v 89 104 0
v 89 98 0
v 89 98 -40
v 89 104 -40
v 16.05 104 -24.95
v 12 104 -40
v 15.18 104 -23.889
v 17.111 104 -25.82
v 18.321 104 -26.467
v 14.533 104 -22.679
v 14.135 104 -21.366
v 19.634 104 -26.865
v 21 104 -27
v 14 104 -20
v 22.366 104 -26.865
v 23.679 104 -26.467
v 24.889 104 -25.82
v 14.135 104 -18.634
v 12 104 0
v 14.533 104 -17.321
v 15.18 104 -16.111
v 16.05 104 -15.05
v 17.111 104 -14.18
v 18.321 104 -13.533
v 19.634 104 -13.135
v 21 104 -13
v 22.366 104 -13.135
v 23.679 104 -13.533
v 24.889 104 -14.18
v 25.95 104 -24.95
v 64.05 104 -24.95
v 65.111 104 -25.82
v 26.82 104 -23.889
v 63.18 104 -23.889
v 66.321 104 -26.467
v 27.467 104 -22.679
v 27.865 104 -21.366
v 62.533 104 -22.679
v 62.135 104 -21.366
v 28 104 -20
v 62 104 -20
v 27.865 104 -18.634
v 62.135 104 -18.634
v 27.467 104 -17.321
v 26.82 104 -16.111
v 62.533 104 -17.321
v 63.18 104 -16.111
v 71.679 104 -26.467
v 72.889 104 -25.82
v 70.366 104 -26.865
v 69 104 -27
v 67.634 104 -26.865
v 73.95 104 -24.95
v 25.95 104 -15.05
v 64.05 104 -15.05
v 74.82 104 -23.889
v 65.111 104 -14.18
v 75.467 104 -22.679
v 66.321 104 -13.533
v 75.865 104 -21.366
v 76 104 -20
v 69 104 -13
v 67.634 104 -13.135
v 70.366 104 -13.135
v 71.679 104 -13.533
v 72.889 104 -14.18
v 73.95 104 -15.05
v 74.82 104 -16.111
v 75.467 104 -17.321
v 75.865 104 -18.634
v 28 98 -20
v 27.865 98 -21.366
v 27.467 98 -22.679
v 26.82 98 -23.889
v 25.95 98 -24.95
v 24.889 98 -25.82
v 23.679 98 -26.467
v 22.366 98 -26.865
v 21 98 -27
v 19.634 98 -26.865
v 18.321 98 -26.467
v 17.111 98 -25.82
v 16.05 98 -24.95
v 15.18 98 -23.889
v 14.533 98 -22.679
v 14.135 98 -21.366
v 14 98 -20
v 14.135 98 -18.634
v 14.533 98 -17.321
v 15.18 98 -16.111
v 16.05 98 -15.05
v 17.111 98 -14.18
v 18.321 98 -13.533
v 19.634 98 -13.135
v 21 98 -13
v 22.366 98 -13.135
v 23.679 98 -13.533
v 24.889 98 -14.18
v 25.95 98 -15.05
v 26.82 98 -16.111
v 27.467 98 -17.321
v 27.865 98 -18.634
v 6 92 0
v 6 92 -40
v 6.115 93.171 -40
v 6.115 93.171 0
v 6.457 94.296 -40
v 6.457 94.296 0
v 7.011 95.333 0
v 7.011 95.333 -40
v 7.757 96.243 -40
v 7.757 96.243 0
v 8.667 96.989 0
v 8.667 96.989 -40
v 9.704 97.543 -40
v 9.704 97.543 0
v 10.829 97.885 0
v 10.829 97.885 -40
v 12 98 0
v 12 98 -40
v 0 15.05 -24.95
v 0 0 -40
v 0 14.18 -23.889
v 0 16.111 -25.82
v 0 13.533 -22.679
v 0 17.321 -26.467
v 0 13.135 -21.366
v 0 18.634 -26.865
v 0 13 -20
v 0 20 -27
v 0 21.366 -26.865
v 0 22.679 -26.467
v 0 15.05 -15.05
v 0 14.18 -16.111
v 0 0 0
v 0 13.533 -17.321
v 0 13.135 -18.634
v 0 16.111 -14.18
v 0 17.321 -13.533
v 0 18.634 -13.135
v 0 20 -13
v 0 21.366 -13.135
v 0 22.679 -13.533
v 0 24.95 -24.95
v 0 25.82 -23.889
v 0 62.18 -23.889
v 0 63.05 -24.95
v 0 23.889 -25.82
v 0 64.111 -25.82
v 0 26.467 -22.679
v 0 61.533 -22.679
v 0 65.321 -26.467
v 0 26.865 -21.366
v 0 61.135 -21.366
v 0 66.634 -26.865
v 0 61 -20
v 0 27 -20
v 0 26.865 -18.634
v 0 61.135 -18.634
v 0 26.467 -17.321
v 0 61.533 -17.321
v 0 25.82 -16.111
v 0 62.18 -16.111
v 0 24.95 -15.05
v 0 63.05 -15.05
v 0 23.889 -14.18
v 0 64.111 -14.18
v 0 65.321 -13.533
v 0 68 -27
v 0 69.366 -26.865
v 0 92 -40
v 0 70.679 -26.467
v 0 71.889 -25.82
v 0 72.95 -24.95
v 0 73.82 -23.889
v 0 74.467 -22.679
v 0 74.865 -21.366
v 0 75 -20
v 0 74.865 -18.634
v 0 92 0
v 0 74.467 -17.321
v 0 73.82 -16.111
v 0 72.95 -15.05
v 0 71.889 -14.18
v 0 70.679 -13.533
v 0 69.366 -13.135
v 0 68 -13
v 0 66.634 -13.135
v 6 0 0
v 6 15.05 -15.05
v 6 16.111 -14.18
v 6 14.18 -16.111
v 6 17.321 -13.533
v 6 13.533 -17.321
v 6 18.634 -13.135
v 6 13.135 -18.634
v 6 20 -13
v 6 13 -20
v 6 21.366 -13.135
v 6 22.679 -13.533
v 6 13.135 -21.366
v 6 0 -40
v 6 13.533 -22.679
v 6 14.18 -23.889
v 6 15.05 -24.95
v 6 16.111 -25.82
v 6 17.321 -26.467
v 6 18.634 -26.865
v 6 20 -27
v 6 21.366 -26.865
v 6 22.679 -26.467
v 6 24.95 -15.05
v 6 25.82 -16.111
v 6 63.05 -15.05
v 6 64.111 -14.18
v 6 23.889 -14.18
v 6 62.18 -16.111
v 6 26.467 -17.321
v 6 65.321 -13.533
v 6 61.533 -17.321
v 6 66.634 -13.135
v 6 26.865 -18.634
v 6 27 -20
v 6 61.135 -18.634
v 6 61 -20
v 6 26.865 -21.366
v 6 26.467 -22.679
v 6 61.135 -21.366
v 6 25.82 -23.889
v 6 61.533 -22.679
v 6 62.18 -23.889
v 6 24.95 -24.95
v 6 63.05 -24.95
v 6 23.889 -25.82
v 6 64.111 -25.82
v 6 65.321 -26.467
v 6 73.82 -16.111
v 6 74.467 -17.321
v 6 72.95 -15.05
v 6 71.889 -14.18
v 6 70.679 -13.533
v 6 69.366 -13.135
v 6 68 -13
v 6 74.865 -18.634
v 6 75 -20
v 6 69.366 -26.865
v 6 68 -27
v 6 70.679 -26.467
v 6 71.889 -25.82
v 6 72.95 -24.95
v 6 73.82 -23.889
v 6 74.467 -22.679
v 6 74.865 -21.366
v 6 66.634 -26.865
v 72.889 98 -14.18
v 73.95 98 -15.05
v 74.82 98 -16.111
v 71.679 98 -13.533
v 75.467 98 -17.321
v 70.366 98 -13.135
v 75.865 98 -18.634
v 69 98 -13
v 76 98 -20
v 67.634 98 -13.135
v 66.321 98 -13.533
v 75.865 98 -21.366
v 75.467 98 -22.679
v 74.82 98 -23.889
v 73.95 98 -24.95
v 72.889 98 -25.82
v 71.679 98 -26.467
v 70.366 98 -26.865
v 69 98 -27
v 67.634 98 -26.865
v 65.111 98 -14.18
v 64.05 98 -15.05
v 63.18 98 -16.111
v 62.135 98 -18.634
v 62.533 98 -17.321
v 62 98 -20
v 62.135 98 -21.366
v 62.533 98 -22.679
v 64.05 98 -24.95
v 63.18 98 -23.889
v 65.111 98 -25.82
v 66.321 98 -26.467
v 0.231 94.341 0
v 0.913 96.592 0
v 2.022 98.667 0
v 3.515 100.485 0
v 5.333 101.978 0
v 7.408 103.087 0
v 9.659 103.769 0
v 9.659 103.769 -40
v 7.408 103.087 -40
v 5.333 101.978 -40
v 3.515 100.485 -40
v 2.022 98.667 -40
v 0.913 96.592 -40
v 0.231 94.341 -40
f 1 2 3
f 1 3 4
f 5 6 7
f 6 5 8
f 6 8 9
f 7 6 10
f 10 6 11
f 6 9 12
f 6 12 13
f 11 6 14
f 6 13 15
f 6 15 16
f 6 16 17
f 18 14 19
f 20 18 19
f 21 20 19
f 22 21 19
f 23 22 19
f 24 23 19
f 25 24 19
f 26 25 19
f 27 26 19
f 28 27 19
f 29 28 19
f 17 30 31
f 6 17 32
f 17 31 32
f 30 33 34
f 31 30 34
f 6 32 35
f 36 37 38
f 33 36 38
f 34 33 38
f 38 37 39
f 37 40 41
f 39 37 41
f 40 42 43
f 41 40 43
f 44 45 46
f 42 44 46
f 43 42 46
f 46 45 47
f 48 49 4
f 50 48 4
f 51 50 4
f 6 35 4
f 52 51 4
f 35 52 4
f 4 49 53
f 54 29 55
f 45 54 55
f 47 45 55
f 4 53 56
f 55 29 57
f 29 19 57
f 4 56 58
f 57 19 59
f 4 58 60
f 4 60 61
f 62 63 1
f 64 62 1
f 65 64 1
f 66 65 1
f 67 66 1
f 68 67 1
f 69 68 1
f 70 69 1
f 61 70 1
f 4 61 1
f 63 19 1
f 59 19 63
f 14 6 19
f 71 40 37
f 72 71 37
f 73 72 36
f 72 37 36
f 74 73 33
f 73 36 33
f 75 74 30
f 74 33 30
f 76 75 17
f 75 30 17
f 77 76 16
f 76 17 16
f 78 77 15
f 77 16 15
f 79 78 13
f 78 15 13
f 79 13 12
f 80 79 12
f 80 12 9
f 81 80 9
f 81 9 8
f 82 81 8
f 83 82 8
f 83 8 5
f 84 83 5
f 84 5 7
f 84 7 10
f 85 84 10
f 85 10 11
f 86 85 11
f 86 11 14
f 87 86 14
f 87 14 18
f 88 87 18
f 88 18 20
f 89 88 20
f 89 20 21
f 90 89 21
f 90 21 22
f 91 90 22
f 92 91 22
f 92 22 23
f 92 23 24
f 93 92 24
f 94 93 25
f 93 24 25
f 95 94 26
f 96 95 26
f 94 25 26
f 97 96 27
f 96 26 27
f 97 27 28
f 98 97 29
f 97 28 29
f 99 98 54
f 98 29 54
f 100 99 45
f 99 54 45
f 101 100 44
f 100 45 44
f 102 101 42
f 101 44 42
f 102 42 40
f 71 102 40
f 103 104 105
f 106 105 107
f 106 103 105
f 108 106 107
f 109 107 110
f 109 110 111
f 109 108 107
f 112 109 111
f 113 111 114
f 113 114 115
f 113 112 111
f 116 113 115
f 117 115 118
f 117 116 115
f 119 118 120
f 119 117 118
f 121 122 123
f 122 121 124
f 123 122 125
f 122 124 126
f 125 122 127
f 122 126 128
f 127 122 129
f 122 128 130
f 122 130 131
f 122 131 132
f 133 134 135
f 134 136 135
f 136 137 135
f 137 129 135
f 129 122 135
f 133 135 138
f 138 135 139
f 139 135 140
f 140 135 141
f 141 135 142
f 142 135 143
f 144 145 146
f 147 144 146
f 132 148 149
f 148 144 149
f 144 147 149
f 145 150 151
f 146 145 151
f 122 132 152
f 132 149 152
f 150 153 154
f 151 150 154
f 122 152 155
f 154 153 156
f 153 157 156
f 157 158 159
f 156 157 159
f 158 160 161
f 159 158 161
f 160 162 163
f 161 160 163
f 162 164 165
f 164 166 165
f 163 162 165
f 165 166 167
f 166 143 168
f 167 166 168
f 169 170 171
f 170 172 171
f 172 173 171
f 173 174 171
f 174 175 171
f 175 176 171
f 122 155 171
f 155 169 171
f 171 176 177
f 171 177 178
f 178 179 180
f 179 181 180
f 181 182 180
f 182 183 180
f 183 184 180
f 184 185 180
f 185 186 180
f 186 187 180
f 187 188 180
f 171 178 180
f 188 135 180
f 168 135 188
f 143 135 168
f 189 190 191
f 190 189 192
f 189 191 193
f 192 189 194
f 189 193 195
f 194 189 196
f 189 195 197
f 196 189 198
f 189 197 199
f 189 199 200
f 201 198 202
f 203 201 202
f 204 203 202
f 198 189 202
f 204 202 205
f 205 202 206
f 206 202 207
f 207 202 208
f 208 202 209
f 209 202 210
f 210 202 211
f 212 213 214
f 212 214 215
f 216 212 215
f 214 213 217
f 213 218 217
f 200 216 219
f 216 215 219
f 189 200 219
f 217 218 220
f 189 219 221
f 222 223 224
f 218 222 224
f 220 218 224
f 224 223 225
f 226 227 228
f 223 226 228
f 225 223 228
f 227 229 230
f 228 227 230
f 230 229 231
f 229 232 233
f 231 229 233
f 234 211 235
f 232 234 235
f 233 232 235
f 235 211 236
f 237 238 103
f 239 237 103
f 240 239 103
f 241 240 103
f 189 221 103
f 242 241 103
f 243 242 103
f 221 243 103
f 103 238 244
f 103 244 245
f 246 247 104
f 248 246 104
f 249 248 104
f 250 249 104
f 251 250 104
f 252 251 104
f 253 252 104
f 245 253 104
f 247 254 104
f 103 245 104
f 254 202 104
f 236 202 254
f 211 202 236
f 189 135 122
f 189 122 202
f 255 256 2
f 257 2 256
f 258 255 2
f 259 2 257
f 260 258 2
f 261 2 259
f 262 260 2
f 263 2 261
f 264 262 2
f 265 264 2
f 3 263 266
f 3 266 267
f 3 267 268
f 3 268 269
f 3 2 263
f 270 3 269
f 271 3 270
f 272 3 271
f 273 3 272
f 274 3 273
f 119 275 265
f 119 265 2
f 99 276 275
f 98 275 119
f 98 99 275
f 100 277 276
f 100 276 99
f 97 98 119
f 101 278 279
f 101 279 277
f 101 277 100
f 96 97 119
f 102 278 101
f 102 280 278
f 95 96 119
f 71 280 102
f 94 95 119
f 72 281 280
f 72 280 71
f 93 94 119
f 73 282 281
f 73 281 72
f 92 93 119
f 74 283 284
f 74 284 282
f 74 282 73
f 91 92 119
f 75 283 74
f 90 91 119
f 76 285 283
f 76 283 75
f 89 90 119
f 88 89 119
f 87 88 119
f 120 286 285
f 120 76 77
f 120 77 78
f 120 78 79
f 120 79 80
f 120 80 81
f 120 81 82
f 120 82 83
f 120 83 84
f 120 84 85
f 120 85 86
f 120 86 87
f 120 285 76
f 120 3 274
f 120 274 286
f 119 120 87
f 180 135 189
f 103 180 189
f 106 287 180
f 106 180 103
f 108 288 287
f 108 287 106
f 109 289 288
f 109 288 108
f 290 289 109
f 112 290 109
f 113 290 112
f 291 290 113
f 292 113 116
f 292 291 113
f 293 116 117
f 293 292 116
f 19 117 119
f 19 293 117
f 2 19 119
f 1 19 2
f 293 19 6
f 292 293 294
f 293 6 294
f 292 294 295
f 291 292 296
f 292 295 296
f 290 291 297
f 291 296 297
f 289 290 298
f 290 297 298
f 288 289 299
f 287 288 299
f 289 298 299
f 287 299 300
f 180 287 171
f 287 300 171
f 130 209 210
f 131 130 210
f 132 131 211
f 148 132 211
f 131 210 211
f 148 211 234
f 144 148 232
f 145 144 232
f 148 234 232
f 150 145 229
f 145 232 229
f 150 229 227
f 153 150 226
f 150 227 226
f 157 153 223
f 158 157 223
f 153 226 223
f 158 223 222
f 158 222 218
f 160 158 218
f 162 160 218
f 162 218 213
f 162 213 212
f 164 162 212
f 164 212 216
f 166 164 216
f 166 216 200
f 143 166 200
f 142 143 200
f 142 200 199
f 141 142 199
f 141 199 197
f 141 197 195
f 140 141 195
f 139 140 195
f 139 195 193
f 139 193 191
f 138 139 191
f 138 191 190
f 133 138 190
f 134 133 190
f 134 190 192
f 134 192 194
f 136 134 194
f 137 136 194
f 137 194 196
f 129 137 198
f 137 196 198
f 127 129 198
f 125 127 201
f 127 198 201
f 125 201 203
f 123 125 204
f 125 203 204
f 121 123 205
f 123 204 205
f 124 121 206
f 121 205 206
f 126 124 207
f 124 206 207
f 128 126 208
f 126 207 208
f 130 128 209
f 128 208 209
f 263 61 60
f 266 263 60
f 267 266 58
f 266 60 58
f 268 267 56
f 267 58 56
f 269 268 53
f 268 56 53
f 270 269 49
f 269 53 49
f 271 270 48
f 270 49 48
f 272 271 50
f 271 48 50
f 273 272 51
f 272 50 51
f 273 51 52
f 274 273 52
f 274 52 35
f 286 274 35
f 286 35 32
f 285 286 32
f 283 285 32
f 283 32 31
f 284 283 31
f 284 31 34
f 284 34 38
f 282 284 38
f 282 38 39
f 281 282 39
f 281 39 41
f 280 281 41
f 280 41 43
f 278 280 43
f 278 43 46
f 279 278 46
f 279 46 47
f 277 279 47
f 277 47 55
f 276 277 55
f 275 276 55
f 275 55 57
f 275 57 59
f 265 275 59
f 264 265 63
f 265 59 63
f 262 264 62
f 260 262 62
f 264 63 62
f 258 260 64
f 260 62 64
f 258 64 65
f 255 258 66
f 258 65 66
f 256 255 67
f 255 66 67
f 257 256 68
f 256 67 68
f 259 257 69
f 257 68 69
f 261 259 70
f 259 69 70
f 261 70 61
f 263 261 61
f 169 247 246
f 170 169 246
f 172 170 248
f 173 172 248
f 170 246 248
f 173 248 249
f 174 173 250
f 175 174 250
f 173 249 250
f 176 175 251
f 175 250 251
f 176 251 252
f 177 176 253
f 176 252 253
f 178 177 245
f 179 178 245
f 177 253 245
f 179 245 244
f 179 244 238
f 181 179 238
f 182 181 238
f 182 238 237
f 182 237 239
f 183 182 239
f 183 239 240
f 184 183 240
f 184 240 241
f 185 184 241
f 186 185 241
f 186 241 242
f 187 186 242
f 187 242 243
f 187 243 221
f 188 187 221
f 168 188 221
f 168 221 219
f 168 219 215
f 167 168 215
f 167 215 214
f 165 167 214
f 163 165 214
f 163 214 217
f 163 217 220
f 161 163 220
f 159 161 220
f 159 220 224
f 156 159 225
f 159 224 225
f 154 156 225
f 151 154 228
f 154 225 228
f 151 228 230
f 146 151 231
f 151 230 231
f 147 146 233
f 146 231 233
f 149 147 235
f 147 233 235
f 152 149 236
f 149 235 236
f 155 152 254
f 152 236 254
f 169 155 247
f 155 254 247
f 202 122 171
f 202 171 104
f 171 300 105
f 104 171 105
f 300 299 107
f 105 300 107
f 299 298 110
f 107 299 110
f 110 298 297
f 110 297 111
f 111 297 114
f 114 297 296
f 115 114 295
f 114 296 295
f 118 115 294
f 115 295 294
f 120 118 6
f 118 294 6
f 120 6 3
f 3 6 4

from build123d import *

# Parameters (mm, degrees)
SKETCH1_W                      = 89
SKETCH1_H                      = 104
BOSS_EXTRUDE1_DEPTH            = 40
SKETCH2_W                      = 83
SKETCH2_H                      = 98
CUT_EXTRUDE1_DEPTH             = 41
F_14_0_14_DIAMETER_HOLE1_D     = 14
F_14_0_14_DIAMETER_HOLE1_DEPTH = 89
F_14_0_14_DIAMETER_HOLE2_D     = 14
F_14_0_14_DIAMETER_HOLE2_DEPTH = 6
FILLET1_R                      = 6
FILLET2_R                      = 12


with BuildPart() as part:
    # Sketch1 → Boss-Extrude1 (new body)
    with BuildSketch(Plane.XY):
        with Locations((44.5, 52)):
            Rectangle(SKETCH1_W, SKETCH1_H)
    extrude(amount=-BOSS_EXTRUDE1_DEPTH)

    # Sketch2 → Cut-Extrude1 (cut, through all)
    with BuildSketch(Plane(origin=(0, 0, -40), x_dir=(-1, 0, 0), z_dir=(0, 0, -1))):
        with Locations((-47.5, 49)):
            Rectangle(SKETCH2_W, SKETCH2_H)
    extrude(amount=-CUT_EXTRUDE1_DEPTH, mode=Mode.SUBTRACT)

    # Ø14.0 (14) Diameter Hole1
    with Locations(Plane.ZY):
        with Locations((-20, 68), (-20, 20)):
            Hole(F_14_0_14_DIAMETER_HOLE1_D / 2, depth=F_14_0_14_DIAMETER_HOLE1_DEPTH)

    # Ø14.0 (14) Diameter Hole2
    with Locations(Plane(origin=(0, 98, 0), x_dir=(-1, 0, 0), z_dir=(0, -1, 0))):
        with Locations((-69, 20), (-21, 20)):
            Hole(F_14_0_14_DIAMETER_HOLE2_D / 2, depth=F_14_0_14_DIAMETER_HOLE2_DEPTH)

    # Fillet1
    fillet1_edges = [part.edges().sort_by_distance(p)[0] for p in [
        (6, 98, -20),
    ]]
    fillet(fillet1_edges, radius=FILLET1_R)

    # Fillet2
    fillet2_edges = [part.edges().sort_by_distance(p)[0] for p in [
        (0, 104, -20),
    ]]
    fillet(fillet2_edges, radius=FILLET2_R)


solid = part.part
